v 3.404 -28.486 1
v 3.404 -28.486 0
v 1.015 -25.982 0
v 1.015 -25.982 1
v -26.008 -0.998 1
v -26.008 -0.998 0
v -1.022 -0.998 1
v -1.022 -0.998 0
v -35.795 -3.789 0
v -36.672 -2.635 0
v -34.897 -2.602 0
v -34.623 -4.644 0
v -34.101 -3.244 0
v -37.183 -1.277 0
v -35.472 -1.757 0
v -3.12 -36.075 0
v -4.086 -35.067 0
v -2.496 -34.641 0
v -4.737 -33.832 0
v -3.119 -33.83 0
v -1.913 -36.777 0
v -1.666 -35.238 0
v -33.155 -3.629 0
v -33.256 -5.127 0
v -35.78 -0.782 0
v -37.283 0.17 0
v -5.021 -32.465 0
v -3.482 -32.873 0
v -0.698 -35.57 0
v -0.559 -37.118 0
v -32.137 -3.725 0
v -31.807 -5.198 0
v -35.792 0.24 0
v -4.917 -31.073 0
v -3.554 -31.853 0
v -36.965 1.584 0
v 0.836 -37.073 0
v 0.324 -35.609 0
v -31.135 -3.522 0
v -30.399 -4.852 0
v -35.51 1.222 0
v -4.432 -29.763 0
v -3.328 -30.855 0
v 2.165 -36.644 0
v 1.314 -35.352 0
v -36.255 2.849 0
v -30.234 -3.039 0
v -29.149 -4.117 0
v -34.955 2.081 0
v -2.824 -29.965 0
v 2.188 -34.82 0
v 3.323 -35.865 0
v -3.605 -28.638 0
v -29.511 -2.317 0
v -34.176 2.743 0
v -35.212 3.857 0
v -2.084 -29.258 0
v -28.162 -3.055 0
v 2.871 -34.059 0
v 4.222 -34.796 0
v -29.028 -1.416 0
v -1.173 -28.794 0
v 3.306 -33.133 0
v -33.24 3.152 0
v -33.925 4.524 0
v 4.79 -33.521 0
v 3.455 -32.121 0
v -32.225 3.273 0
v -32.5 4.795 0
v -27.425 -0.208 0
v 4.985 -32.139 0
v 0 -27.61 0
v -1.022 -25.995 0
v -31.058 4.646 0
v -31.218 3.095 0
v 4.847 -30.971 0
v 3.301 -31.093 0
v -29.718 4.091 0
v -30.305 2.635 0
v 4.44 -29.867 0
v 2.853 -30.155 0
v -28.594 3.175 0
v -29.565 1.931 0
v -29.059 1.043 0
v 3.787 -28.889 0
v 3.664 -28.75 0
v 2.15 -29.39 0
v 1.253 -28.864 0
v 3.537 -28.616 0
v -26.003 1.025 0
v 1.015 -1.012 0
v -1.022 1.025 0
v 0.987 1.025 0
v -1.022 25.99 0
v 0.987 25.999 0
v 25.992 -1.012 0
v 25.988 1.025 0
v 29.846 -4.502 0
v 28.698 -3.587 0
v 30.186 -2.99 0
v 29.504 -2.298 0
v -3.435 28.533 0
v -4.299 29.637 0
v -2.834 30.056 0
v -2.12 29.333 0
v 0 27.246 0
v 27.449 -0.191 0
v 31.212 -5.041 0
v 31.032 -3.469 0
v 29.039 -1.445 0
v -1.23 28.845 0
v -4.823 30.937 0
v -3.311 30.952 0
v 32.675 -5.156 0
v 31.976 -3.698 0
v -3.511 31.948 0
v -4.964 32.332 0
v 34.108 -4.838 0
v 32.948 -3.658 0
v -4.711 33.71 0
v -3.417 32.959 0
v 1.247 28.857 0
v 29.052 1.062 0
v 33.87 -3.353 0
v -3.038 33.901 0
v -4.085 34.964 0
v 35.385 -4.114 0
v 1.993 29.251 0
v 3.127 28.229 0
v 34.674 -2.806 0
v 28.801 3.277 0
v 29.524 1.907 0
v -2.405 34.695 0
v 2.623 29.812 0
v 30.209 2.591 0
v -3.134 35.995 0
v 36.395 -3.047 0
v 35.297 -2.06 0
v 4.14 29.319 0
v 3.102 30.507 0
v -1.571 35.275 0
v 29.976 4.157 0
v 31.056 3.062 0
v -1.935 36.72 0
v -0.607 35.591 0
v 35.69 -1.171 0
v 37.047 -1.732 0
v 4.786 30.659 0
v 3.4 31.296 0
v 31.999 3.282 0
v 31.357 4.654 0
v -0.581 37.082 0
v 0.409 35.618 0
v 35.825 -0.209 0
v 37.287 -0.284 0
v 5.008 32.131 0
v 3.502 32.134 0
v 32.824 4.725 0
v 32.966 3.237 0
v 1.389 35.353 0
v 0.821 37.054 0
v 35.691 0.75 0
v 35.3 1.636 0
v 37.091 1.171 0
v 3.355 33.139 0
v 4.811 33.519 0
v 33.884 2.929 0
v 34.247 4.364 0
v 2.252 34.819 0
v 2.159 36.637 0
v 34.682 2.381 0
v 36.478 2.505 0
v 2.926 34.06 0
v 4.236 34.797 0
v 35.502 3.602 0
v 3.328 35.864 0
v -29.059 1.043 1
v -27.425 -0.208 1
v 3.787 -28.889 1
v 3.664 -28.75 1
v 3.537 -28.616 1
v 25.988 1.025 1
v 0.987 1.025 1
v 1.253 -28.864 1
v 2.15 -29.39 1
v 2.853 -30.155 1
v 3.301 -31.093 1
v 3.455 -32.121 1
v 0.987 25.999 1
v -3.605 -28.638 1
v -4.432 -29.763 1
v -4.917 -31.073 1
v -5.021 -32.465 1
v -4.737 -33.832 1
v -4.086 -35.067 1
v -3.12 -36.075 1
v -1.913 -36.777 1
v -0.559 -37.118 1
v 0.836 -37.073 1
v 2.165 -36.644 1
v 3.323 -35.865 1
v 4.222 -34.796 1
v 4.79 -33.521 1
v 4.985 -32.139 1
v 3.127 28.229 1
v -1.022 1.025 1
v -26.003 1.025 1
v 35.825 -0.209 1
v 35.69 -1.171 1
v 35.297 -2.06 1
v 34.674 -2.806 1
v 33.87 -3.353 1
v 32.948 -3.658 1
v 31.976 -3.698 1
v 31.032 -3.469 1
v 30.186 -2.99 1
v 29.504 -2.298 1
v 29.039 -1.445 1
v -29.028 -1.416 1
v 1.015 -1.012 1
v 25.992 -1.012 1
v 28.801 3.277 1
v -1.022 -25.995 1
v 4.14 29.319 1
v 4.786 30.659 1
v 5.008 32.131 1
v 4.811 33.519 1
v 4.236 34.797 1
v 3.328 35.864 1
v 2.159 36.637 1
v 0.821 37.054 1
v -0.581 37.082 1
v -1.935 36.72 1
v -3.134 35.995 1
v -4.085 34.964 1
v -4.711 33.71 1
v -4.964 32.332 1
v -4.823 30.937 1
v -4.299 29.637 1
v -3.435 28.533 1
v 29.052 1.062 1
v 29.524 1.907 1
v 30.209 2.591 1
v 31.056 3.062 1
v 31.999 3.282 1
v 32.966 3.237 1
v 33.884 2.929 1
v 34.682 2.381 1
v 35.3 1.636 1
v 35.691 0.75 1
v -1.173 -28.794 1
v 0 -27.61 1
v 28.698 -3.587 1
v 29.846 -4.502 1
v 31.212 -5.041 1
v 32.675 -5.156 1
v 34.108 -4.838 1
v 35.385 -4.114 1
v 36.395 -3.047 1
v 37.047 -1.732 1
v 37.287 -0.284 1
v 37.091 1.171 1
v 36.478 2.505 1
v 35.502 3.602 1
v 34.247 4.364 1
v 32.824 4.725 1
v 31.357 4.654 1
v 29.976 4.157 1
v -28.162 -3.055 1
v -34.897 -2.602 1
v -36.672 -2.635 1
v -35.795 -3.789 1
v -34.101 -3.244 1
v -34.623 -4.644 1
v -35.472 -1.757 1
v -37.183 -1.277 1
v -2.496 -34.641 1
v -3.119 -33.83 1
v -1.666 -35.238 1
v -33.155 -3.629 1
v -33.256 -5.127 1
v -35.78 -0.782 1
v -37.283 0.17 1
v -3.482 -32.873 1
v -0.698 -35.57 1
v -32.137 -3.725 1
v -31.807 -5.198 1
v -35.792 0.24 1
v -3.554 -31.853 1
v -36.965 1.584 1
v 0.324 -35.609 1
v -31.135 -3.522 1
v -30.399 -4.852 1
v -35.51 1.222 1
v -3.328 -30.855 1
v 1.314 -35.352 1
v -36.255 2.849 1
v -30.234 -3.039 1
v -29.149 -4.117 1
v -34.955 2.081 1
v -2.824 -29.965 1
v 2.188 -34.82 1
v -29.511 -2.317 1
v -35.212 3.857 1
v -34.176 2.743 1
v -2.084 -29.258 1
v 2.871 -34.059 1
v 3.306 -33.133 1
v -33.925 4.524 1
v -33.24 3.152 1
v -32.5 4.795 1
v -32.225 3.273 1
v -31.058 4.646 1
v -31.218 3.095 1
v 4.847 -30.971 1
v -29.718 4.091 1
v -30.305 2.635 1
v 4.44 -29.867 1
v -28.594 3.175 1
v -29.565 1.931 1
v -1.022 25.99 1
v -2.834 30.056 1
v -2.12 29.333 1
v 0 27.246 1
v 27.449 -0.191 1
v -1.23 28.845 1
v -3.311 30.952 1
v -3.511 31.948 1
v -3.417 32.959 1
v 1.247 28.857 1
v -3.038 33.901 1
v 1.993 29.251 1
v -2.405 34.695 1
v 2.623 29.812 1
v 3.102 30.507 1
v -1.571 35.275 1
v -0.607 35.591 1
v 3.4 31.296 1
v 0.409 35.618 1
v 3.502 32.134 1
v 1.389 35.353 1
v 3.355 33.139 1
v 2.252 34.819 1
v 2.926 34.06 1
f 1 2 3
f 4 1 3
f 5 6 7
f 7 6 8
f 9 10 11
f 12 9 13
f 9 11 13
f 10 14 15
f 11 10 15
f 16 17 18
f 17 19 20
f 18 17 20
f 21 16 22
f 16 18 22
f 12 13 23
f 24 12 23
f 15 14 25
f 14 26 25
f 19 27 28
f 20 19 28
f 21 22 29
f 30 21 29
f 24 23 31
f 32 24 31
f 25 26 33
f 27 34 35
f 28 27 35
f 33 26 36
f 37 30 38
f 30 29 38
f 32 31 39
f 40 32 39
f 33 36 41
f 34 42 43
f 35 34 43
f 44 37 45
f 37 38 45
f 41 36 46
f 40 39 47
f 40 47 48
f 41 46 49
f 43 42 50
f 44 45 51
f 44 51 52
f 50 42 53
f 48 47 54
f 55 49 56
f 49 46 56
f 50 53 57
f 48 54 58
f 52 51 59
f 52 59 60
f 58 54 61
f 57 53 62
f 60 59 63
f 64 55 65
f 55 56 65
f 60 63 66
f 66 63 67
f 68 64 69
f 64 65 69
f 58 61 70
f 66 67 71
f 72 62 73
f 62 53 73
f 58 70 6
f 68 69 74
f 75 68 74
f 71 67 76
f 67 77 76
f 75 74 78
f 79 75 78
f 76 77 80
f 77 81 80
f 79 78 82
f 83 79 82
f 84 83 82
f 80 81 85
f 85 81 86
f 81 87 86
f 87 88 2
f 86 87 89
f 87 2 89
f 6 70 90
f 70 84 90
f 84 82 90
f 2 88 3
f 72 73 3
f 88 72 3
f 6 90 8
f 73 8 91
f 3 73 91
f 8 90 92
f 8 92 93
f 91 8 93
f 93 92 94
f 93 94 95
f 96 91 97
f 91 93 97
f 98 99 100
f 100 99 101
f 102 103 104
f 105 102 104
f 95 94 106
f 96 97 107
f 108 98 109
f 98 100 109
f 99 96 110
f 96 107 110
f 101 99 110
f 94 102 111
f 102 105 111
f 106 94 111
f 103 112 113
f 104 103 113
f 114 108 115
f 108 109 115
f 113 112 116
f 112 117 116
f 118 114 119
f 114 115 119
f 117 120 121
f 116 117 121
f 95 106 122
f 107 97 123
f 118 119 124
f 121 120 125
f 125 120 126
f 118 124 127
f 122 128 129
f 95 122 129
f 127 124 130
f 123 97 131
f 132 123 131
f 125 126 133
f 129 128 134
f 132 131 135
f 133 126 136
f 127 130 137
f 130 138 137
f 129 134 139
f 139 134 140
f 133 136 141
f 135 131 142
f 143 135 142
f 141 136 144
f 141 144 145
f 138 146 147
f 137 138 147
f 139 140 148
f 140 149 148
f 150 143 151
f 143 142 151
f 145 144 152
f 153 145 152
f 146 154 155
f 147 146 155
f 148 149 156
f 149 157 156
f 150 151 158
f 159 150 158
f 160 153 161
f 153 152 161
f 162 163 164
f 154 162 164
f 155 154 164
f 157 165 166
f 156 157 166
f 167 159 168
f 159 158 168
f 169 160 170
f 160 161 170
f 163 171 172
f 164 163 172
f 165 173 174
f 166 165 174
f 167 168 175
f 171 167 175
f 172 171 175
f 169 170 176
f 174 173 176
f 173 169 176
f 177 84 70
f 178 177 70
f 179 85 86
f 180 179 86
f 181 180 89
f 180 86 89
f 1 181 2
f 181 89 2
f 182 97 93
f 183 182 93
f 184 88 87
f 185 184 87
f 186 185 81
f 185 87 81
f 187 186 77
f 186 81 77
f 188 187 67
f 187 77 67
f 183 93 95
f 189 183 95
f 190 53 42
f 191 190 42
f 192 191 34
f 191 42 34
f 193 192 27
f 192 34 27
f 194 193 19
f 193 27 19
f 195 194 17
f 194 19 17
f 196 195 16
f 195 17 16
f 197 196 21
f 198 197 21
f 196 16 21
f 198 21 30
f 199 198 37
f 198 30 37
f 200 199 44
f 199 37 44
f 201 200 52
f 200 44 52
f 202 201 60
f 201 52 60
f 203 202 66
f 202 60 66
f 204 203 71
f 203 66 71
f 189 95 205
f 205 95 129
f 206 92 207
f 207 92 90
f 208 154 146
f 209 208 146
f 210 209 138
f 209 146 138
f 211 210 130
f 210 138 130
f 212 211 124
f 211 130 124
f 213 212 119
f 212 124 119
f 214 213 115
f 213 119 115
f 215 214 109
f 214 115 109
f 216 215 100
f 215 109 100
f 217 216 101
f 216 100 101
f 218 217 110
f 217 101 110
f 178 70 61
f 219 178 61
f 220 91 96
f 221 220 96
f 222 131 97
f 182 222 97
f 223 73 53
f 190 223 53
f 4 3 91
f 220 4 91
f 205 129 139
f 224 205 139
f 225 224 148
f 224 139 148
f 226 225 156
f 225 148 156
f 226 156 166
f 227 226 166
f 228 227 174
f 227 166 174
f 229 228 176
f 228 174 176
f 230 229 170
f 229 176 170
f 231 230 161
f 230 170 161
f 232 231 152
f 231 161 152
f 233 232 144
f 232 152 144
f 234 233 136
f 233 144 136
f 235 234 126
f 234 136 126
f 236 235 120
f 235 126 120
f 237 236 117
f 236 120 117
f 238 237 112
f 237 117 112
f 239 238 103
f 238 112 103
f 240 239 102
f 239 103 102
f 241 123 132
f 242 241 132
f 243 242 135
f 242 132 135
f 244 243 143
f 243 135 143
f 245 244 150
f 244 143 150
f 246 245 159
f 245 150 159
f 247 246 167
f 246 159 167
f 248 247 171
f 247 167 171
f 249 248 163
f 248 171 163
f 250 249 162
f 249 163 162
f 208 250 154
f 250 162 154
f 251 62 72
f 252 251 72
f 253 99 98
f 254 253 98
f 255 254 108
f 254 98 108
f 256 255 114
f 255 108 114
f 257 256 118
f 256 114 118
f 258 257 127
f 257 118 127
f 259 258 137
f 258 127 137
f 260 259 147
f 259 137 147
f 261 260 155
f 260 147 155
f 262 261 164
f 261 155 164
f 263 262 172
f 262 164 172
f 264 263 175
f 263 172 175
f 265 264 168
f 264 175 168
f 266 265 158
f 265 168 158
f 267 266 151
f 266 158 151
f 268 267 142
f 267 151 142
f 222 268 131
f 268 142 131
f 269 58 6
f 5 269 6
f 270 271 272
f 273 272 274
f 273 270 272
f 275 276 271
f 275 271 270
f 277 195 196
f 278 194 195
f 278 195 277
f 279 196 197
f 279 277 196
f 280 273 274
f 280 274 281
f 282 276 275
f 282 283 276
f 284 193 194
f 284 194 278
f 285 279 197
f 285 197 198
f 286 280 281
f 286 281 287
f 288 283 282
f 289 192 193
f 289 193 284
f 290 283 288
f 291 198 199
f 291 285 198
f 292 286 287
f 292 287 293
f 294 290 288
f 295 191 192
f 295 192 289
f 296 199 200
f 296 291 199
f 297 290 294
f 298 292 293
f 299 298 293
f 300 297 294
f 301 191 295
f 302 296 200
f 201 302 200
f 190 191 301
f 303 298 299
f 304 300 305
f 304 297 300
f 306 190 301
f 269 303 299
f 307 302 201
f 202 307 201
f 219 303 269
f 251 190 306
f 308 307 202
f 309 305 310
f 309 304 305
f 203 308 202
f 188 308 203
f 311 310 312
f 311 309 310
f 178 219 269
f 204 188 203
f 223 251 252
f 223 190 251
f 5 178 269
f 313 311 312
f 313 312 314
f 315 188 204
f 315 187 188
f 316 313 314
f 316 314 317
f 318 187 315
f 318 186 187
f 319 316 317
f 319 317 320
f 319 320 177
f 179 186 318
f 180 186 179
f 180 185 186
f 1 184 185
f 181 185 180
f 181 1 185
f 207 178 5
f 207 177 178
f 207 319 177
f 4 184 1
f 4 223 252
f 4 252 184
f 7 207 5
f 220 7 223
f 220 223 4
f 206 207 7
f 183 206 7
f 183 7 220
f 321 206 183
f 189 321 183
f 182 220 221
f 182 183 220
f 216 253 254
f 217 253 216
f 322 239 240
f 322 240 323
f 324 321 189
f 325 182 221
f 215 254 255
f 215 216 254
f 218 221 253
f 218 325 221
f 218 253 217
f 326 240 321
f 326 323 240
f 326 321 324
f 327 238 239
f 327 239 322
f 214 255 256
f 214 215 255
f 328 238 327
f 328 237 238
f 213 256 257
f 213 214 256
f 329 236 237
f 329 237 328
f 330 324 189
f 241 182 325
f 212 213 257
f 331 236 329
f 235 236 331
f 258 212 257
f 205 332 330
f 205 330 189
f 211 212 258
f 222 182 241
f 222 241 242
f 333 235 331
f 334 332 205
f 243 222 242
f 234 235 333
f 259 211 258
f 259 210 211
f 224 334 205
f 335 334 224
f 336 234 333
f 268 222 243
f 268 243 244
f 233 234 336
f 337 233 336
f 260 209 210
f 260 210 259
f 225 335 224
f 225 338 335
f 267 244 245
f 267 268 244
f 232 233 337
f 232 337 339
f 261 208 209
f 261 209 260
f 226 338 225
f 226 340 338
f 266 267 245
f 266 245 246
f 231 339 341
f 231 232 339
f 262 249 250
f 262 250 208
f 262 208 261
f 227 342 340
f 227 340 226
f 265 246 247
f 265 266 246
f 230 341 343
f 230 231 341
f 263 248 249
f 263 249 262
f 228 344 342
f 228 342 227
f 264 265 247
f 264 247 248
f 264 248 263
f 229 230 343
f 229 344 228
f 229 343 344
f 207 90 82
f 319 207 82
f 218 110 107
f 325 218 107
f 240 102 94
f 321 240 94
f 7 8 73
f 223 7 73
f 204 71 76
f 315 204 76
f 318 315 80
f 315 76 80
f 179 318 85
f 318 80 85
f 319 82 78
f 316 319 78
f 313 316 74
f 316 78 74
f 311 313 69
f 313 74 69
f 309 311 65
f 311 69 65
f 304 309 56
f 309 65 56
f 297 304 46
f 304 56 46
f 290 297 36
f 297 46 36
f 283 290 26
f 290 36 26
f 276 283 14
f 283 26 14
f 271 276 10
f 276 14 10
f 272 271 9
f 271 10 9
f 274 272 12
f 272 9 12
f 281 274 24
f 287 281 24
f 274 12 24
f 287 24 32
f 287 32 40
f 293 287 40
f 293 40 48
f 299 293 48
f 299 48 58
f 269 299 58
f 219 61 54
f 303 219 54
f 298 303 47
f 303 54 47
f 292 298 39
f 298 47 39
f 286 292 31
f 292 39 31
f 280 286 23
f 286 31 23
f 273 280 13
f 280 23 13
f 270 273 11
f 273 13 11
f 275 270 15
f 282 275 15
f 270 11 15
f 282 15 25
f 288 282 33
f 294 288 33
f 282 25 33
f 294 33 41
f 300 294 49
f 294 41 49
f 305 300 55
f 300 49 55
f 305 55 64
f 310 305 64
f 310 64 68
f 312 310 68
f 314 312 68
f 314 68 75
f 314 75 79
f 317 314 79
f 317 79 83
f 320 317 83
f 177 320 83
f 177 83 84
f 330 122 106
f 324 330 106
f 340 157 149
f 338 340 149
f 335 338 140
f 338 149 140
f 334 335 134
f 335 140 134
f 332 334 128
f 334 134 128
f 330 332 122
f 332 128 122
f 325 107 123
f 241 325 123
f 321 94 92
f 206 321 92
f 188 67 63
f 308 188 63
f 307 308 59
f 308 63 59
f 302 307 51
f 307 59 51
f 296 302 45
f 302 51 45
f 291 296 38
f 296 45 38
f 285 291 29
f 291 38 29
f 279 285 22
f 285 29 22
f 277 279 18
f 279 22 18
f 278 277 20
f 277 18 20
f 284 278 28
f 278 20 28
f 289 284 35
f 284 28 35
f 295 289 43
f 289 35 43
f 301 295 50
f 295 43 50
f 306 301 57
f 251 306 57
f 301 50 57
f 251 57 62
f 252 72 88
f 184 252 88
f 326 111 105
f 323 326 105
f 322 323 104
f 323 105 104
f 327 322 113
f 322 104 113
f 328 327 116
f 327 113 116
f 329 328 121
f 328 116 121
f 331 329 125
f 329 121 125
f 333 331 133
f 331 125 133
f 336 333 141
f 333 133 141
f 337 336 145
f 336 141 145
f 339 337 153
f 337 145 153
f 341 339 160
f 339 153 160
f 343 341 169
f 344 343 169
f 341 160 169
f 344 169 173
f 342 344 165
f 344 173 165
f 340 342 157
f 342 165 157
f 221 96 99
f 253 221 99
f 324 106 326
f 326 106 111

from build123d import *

# Parameters (mm, degrees)
F1_DEPTH = 1


with BuildPart() as f1:
    # F0 (on Top) → F1 (new body)
    with BuildSketch(Plane.XY):
        with BuildLine():
            ThreePointArc((-27.3388900485, -0.9977917653), (-27.2922865727, -0.6055926478), (-27.2767198383, -0.2109412719))
            ThreePointArc((-27.2767198383, -0.2109412719), (-27.3156011331, 0.4120452206), (-27.4316415742, 1.0253628716))
            ThreePointArc((-27.4316415742, 1.0253628716), (-27.8797003635, 2.1720812966), (-28.5938661896, 3.1749207641))
            ThreePointArc((-28.5938661896, 3.1749207641), (-37.2855795833, -0.5574762051), (-28.1619703008, -3.0547592313))
            ThreePointArc((-28.1619703008, -3.0547592313), (-27.6353110241, -2.0723395713), (-27.3388900485, -0.9977917653))
        make_face()
        with BuildLine():
            ThreePointArc((-29.0279696038, -1.4164111001), (-35.823533245, -0.271588351), (-29.0587042579, 1.0427149257))
            Line((-29.0587042579, 1.0427149257), (-27.4248942733, -0.2084955195))
            Line((-27.4248942733, -0.2084955195), (-29.0279696038, -1.4164111001))
        make_face(mode=Mode.SUBTRACT)
        with BuildLine():
            ThreePointArc((-27.4316415742, 1.0253628716), (-27.3156011331, 0.4120452206), (-27.2767198383, -0.2109412719))
            ThreePointArc((-27.2767198383, -0.2109412719), (-27.2922865727, -0.6055926478), (-27.3388900485, -0.9977917653))
            Line((-27.3388900485, -0.9977917653), (-26.0078907013, -0.9977917653))
            Line((-26.0078907013, -0.9977917653), (-1.021916396, -0.9977917653))
            Line((-1.021916396, -0.9977917653), (-1.021916396, 1.0253628716))
            Line((-1.021916396, 1.0253628716), (-26.0030180216, 1.0253628716))
            Line((-26.0030180216, 1.0253628716), (-27.4316415742, 1.0253628716))
        make_face()
        with BuildLine():
            ThreePointArc((-28.5938661896, 3.1749207641), (-27.8797003635, 2.1720812966), (-27.4316415742, 1.0253628716))
            Line((-27.4316415742, 1.0253628716), (-26.0030180216, 1.0253628716))
            Line((-26.0030180216, 1.0253628716), (-28.5938661896, 3.1749207641))
        make_face()
        with BuildLine():
            Line((-26.0078907013, -0.9977917653), (-27.3388900485, -0.9977917653))
            ThreePointArc((-27.3388900485, -0.9977917653), (-27.6353110241, -2.0723395713), (-28.1619703008, -3.0547592313))
            Line((-28.1619703008, -3.0547592313), (-26.0078907013, -0.9977917653))
        make_face()
        Polygon((0.9874751559, 1.0253628716), (-1.021916396, 1.0253628716), (-1.021916396, -0.9977917653), (1.015001093, -1.0115547339), align=None)
        with BuildLine():
            Line((-1.021916396, 25.9902365506), (-1.021916396, 1.0253628716))
            Line((-1.021916396, 1.0253628716), (0.9874751559, 1.0253628716))
            Line((0.9874751559, 1.0253628716), (0.9874751559, 25.9992666543))
            Line((0.9874751559, 25.9992666543), (3.1274161369, 28.2286134091))
            ThreePointArc((3.1274161369, 28.2286134091), (-0.2110990703, 27.1480978017), (-3.4350626667, 28.5334701326))
            Line((-3.4350626667, 28.5334701326), (-1.021916396, 25.9902365506))
        make_face()
        with BuildLine():
            Line((1.015001093, -1.0115547339), (-1.021916396, -0.9977917653))
            Line((-1.021916396, -0.9977917653), (-1.021916396, -25.9947646409))
            Line((-1.021916396, -25.9947646409), (-3.6052718224, -28.6383550821))
            ThreePointArc((-3.6052718224, -28.6383550821), (-0.1318413861, -27.131580678), (3.4036372353, -28.4863791938))
            Line((3.4036372353, -28.4863791938), (1.015001093, -25.9817112237))
            Line((1.015001093, -25.9817112237), (1.015001093, -1.0115547339))
        make_face()
        with BuildLine():
            Line((25.9883347899, 1.0253628716), (0.9874751559, 1.0253628716))
            Line((0.9874751559, 1.0253628716), (1.015001093, -1.0115547339))
            Line((1.015001093, -1.0115547339), (25.9923934937, -1.0115547339))
            Line((25.9923934937, -1.0115547339), (28.6975805016, -3.5872808494))
            ThreePointArc((28.6975805016, -3.5872808494), (27.369536281, -0.1344353197), (28.8009183125, 3.2768678307))
            Line((28.8009183125, 3.2768678307), (25.9883347899, 1.0253628716))
        make_face()
        with BuildLine():
            ThreePointArc((5.0084020941, 32.1307584701), (-1.9347123757, 36.7196739343), (-3.4350626667, 28.5334701326))
            ThreePointArc((-3.4350626667, 28.5334701326), (-0.2110990703, 27.1480978017), (3.1274161369, 28.2286134091))
            ThreePointArc((3.1274161369, 28.2286134091), (4.5136154985, 29.9648380971), (5.0084020941, 32.1307584701))
        make_face()
        with BuildLine():
            ThreePointArc((-1.2298567505, 28.8454476519), (-2.0094686913, 35.0154222768), (3.5018862947, 32.1342163019))
            ThreePointArc((3.5018862947, 32.1342163019), (2.8835722571, 30.1450564857), (1.2465469638, 28.8569504291))
            Line((1.2465469638, 28.8569504291), (0, 27.2457357496))
            Line((0, 27.2457357496), (-1.2298567505, 28.8454476519))
        make_face(mode=Mode.SUBTRACT)
        with BuildLine():
            ThreePointArc((3.4036372353, -28.4863791938), (-0.1318413861, -27.131580678), (-3.6052718224, -28.6383550821))
            ThreePointArc((-3.6052718224, -28.6383550821), (-1.9131855373, -36.7768054017), (4.9850663184, -32.1387399713))
            ThreePointArc((4.9850663184, -32.1387399713), (4.6761248214, -30.4069429432), (3.7874147234, -28.8887992883))
            Line((3.7874147234, -28.8887992883), (3.4036372353, -28.4863791938))
        make_face()
        with BuildLine():
            ThreePointArc((1.2534396715, -28.8638722912), (2.8530229788, -30.1549993601), (3.4550732676, -32.1205047187))
            ThreePointArc((3.4550732676, -32.1205047187), (-2.102698937, -34.9700851409), (-1.1725544757, -28.7940207192))
            Line((-1.1725544757, -28.7940207192), (0, -27.6099070907))
            Line((0, -27.6099070907), (1.2534396715, -28.8638722912))
        make_face(mode=Mode.SUBTRACT)
        with BuildLine():
            ThreePointArc((37.2871905838, -0.209084826), (34.2123813861, 4.378089767), (28.8009183125, 3.2768678307))
            ThreePointArc((28.8009183125, 3.2768678307), (27.369536281, -0.1344353197), (28.6975805016, -3.5872808494))
            ThreePointArc((28.6975805016, -3.5872808494), (34.1431171019, -4.8241040496), (37.2871905838, -0.209084826))
        make_face()
        with BuildLine():
            ThreePointArc((29.0519181081, 1.062034124), (32.9656955311, 3.2370827906), (35.8250662459, -0.2085651216))
            ThreePointArc((35.8250662459, -0.2085651216), (32.947537117, -3.6575699539), (29.0387142098, -1.4446732776))
            Line((29.0387142098, -1.4446732776), (27.4487081915, -0.1906345278))
            Line((27.4487081915, -0.1906345278), (29.0519181081, 1.062034124))
        make_face(mode=Mode.SUBTRACT)
        with BuildLine():
            ThreePointArc((3.7874147234, -28.8887992883), (3.6011154409, -28.6822587182), (3.4036372353, -28.4863791938))
            Line((3.4036372353, -28.4863791938), (3.7874147234, -28.8887992883))
        make_face()
    extrude(amount=F1_DEPTH)


solid = f1.part
